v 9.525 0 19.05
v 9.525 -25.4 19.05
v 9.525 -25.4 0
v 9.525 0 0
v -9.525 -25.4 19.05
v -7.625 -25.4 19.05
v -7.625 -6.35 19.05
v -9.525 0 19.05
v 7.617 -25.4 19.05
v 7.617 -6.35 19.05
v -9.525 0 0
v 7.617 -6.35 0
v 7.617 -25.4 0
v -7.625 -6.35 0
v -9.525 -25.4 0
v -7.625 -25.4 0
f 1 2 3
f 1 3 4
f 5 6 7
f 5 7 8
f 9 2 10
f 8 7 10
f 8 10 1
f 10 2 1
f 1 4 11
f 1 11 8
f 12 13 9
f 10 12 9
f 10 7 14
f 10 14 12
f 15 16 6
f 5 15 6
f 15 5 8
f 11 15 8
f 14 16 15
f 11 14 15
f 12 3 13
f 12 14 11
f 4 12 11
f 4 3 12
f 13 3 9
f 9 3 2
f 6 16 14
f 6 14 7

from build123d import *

# Parameters (mm, degrees)
F0_W     = 25.4
F0_H     = 19.05
F1_DEPTH = 9.525
F2_W     = 15.2418981306
F2_H     = 19.05
F3_DEPTH = 19.05


# Not quite as in the source:
# - a feature names something its author has since deleted; it is built from what else it names


with BuildPart() as f1:
    # F0 (on Right) → F1 (new body, symmetric)
    with BuildSketch(Plane.YZ):
        with Locations((-12.7, 9.525)):
            Rectangle(F0_W, F0_H)
    extrude(amount=F1_DEPTH, both=True)

    # F2 (on face) → F3 (cut)
    with BuildSketch(Plane.XZ.offset(25.4)):
        with Locations((-0.004085945, 9.525)):
            Rectangle(F2_W, F2_H)
    extrude(amount=-F3_DEPTH, mode=Mode.SUBTRACT)


solid = f1.part
